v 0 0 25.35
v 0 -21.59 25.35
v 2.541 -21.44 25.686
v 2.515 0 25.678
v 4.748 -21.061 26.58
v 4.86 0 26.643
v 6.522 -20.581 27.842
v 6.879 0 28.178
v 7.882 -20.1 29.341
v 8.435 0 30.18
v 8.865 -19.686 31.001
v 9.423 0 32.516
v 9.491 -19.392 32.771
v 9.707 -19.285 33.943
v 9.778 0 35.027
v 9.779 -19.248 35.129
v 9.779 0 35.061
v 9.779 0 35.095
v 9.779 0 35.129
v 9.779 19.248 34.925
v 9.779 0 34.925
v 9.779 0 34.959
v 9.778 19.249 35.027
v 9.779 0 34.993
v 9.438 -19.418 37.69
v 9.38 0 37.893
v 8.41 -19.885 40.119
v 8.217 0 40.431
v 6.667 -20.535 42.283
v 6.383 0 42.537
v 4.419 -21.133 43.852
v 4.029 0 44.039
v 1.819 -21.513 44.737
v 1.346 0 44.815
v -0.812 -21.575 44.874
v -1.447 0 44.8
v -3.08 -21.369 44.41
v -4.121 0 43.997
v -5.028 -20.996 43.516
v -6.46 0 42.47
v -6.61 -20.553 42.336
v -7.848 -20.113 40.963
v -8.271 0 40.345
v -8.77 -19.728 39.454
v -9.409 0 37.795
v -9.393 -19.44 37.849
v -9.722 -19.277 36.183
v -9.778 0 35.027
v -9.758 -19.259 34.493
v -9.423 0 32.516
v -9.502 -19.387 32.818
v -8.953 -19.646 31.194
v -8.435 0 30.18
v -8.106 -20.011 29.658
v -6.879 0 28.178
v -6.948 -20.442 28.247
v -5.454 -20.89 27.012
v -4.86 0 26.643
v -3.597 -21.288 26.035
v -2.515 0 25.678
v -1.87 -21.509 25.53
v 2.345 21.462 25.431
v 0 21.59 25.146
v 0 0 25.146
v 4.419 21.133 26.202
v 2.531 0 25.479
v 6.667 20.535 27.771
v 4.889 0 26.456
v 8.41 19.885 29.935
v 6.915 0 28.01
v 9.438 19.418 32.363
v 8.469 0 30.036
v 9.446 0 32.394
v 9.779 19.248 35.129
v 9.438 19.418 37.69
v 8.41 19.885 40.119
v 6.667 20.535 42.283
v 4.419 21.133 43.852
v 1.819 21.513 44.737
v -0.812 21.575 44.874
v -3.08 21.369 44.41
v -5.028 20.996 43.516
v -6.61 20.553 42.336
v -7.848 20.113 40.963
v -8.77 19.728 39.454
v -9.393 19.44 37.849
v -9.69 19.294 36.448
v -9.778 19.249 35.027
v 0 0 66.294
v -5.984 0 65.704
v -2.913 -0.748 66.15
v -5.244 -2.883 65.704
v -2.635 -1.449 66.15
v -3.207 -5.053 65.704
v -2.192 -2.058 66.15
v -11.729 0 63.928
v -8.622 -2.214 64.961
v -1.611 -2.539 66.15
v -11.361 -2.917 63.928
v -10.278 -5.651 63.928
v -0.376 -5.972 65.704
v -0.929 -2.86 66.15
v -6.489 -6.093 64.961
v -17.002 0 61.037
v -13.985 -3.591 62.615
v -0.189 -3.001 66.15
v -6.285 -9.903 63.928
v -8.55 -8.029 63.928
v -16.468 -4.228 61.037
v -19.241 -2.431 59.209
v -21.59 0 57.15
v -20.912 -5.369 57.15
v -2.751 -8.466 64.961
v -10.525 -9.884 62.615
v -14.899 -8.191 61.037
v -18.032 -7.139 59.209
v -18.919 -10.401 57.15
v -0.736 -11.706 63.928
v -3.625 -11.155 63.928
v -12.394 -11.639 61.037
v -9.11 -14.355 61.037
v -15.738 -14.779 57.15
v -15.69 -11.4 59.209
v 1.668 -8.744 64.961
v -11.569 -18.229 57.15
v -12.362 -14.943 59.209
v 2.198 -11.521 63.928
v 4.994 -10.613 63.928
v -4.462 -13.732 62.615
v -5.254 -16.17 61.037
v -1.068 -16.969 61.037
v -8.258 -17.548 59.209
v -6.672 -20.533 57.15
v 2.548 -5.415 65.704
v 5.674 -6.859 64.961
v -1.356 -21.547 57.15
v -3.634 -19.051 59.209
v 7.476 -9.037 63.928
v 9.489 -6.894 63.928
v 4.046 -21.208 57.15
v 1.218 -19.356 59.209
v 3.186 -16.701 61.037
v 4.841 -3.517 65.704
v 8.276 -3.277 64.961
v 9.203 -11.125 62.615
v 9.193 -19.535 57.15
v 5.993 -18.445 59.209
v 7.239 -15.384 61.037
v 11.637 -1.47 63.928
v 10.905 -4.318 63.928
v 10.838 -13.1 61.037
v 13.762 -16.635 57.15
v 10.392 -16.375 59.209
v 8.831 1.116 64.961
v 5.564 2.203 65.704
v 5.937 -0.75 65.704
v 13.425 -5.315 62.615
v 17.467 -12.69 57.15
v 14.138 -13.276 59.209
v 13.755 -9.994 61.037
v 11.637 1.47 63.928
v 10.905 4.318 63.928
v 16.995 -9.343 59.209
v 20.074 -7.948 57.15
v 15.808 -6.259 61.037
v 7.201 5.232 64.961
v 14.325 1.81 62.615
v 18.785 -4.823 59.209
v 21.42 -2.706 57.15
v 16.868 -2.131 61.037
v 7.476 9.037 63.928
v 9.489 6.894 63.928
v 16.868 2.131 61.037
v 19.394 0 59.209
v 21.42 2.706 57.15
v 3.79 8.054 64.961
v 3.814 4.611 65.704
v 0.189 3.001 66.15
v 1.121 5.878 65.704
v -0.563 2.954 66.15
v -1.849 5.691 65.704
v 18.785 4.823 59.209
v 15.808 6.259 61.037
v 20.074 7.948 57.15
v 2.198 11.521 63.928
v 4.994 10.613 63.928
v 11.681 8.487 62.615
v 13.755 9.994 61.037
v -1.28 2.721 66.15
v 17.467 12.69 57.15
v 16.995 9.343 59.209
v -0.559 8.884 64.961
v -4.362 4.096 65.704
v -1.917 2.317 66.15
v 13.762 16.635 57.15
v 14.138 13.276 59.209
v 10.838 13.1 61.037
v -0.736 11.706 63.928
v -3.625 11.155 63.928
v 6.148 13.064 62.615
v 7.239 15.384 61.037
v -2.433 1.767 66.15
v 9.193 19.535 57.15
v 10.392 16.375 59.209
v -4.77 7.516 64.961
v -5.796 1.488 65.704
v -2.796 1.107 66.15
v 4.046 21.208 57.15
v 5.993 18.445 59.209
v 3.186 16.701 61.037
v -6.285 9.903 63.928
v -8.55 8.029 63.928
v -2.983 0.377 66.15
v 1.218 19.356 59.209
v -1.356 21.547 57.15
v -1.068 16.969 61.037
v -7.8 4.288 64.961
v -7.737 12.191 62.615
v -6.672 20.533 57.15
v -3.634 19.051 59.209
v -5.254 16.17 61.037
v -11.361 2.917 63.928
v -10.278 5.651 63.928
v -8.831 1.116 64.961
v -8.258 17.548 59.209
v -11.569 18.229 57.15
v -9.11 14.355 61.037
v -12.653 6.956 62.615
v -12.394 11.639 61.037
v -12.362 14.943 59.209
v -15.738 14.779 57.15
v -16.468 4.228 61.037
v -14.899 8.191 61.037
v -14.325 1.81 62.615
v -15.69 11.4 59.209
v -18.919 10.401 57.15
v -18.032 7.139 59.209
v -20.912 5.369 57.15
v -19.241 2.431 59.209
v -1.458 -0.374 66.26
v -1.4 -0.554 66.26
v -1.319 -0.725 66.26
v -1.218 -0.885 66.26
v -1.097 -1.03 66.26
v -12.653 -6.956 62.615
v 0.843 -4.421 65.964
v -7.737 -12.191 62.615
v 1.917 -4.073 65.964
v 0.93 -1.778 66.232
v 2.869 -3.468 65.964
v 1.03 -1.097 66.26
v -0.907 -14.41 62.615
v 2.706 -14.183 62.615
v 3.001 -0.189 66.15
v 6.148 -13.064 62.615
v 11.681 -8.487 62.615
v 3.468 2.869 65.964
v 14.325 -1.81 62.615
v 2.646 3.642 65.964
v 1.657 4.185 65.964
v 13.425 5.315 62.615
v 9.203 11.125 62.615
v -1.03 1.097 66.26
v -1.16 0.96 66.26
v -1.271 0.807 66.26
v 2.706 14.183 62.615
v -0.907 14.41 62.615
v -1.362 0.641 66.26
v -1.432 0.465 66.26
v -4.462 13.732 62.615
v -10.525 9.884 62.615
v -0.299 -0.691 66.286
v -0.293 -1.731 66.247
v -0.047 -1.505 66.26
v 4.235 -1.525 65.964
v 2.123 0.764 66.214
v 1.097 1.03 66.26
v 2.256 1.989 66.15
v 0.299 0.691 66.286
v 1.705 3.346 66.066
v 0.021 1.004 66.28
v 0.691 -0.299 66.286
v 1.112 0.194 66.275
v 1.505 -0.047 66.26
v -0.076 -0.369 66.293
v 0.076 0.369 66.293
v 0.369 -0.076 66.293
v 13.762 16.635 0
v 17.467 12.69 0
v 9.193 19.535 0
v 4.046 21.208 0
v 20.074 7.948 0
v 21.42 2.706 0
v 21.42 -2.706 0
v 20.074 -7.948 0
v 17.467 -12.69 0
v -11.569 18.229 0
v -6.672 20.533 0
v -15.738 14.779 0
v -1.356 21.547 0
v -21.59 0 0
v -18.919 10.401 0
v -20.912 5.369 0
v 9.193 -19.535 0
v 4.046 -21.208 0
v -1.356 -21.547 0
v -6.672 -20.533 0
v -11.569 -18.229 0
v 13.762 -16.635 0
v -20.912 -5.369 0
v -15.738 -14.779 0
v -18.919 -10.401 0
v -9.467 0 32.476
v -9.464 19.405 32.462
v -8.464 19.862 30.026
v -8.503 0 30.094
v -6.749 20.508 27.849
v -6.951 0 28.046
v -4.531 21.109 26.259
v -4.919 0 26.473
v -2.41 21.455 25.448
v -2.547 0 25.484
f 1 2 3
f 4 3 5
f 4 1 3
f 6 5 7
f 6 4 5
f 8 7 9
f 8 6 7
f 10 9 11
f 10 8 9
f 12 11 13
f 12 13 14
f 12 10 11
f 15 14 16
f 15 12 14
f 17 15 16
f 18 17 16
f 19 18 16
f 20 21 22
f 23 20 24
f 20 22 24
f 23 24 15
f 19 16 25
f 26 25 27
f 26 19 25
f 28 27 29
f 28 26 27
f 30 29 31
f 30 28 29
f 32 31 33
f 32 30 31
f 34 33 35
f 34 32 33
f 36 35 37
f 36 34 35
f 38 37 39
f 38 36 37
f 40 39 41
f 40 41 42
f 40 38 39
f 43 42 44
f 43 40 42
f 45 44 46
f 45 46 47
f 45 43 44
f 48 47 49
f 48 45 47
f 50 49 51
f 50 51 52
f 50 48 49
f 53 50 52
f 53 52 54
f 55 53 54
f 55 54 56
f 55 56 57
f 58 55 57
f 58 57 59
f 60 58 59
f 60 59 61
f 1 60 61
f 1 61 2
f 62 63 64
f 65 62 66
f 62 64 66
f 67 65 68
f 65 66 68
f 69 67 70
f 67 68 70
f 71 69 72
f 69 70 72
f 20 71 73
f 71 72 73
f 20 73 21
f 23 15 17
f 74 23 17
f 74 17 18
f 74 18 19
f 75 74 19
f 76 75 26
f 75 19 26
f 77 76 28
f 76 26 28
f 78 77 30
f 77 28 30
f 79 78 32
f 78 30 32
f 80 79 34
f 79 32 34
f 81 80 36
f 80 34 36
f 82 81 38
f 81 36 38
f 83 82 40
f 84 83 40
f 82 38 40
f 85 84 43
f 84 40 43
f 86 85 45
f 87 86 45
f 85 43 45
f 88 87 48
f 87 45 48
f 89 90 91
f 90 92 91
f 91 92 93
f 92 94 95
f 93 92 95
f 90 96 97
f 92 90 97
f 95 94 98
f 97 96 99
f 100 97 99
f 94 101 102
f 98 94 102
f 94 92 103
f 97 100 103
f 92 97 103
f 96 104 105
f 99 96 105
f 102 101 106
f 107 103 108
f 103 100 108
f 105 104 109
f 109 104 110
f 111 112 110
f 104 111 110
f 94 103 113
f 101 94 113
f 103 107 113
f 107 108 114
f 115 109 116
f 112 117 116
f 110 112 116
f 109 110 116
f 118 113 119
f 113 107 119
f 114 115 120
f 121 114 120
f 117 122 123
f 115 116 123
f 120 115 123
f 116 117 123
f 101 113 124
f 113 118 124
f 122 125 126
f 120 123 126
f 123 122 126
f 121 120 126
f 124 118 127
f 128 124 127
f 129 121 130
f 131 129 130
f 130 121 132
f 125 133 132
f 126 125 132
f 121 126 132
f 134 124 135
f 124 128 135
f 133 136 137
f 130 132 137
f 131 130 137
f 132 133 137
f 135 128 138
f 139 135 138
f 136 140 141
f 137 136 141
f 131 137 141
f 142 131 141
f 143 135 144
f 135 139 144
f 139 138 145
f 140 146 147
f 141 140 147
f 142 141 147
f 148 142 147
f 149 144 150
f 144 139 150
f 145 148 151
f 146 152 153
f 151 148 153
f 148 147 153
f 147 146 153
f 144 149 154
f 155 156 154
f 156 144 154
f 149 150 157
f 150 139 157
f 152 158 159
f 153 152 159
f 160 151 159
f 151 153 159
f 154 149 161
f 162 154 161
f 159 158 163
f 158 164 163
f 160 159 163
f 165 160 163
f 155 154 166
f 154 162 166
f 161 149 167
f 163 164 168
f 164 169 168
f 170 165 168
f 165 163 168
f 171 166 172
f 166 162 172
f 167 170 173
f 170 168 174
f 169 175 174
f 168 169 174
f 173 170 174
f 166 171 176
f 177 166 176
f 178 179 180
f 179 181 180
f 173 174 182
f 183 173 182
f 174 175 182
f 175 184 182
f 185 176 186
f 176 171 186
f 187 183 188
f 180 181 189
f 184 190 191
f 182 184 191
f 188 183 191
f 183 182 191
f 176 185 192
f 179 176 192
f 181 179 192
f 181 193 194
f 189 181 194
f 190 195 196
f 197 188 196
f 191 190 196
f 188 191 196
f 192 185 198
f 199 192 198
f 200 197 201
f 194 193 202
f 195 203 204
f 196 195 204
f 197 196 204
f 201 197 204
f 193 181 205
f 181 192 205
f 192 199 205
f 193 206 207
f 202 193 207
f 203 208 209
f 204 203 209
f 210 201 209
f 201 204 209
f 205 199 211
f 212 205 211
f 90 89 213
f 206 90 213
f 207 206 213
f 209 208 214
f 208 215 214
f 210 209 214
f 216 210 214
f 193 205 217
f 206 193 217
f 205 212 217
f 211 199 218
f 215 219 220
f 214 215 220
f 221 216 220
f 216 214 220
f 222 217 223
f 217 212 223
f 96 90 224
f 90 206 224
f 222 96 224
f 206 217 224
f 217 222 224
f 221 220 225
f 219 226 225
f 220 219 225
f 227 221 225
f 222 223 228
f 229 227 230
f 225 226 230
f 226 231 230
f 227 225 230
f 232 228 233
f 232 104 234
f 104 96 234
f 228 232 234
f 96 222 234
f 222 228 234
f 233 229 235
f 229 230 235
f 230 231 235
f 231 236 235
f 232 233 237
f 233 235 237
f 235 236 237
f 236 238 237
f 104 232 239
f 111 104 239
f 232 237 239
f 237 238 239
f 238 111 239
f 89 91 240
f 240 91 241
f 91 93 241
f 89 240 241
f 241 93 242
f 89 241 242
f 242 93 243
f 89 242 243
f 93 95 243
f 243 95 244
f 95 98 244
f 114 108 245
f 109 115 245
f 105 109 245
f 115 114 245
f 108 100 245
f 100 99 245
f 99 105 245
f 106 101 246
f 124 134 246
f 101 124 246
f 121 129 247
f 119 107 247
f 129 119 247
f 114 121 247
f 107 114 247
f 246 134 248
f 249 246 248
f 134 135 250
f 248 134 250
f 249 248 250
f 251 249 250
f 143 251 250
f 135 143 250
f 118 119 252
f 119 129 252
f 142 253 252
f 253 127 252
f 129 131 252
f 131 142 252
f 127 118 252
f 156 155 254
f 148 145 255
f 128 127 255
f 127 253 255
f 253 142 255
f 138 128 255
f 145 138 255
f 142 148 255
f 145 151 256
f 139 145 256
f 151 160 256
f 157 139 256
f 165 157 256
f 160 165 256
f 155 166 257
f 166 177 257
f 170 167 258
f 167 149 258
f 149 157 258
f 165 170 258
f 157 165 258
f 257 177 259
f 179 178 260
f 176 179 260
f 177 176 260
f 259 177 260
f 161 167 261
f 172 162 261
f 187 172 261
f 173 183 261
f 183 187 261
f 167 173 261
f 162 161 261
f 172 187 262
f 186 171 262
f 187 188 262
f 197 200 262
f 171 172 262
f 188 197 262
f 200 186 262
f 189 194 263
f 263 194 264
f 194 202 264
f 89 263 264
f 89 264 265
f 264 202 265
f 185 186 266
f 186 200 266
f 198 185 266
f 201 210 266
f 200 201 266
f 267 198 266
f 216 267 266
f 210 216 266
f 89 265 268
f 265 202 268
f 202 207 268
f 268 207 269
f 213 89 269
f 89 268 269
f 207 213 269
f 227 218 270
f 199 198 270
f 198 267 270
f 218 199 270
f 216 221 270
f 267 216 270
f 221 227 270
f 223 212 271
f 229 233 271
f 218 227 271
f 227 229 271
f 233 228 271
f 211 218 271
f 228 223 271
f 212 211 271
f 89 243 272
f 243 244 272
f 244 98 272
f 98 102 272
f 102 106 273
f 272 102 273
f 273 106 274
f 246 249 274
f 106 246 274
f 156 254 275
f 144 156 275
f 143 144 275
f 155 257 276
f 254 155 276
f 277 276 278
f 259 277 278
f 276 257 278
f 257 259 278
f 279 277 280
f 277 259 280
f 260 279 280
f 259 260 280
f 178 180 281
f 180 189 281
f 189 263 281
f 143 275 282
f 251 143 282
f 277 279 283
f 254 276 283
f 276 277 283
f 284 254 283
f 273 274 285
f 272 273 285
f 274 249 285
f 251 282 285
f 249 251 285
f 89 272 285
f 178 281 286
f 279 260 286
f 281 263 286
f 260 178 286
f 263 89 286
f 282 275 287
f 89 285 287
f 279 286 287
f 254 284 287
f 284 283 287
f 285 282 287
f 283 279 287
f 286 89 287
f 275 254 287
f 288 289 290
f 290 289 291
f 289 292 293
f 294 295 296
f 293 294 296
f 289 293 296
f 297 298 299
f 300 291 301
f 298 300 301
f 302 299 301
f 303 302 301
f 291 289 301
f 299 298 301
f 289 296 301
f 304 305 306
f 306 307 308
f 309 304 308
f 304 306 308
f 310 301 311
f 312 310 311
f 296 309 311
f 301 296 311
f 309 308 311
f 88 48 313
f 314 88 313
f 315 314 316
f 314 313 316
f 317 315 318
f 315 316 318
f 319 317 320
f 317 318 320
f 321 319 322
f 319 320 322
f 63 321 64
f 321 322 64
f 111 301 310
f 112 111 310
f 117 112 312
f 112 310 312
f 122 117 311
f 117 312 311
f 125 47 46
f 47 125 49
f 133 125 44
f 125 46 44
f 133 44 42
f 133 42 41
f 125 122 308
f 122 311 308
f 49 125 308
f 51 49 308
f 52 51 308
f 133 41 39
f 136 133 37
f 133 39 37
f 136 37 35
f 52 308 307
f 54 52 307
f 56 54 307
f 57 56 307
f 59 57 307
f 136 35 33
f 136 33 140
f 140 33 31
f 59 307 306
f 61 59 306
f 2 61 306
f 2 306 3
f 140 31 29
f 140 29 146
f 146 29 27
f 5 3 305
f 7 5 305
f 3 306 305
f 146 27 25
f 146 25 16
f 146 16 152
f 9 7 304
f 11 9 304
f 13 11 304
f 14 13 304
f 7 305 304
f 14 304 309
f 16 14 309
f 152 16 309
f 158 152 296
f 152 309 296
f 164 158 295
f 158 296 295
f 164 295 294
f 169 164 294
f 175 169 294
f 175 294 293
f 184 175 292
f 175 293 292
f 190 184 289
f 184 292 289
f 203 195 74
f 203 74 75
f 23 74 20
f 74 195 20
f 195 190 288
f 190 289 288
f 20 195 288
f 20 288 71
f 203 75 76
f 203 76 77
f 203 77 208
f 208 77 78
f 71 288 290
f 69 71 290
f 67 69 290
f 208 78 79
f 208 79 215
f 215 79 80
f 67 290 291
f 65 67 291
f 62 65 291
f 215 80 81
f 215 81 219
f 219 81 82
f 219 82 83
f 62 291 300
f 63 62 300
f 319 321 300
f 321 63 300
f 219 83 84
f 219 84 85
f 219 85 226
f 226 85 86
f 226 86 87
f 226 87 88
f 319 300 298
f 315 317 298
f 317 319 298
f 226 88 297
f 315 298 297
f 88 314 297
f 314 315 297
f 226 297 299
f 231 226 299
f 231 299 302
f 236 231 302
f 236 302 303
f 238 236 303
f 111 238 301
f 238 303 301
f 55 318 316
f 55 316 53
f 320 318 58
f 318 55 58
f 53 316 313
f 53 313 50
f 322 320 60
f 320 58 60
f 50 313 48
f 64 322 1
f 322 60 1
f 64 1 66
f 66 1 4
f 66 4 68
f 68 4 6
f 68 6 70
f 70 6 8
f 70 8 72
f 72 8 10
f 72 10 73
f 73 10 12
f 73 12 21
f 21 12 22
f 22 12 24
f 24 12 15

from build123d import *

# Parameters (mm, degrees)
F4_DEPTH       = 21.5910001
F5_DEPTH       = 21.5910001
F6_DEPTH       = 21.5910001
F7_DEPTH       = 21.5910001
F8_DEPTH       = 21.5910001
F9_DEPTH       = 21.5910001
F11_DEPTH      = 21.5910001
F12_DEPTH      = 21.5910001
F12_DEPTH_BACK = 25.4


with BuildPart() as f1:
    # F0 (on Front) → F1 (revolve)
    with BuildSketch(Plane.XZ):
        with BuildLine():
            Line((-21.59, 0), (0, 0))
            Line((0, 0), (0, 66.294))
            ThreePointArc((0, 66.294), (-11.7291440927, 63.9276179966), (-21.59, 57.15))
            Line((-21.59, 57.15), (-21.59, 0))
        make_face()
    revolve(axis=Axis((0, 0, 33.147), (0, 0, 1)))

    # F3 (on Front) → F4 (cut, through all)
    with BuildSketch(Plane.XZ):
        with BuildLine():
            ThreePointArc((0, 25.146), (6.9147972132, 28.0102027868), (9.779, 34.925))
            ThreePointArc((9.779, 34.925), (-6.9147972132, 41.8397972132), (0, 25.146))
        make_face()
    extrude(amount=-F4_DEPTH, mode=Mode.SUBTRACT)

    # F2 (on Front) → F5 (cut, through all)
    with BuildSketch(Plane.XZ):
        with BuildLine():
            ThreePointArc((0, 25.146), (6.9147972132, 28.0102027868), (9.779, 34.925))
            ThreePointArc((9.779, 34.925), (-6.9147972132, 41.8397972132), (0, 25.146))
        make_face()
    extrude(amount=-F5_DEPTH, mode=Mode.SUBTRACT)

    # F3 (on Front) → F6 (cut, through all)
    with BuildSketch(Plane.XZ):
        with BuildLine():
            ThreePointArc((0, 25.146), (6.9147972132, 28.0102027868), (9.779, 34.925))
            ThreePointArc((9.779, 34.925), (-6.9147972132, 41.8397972132), (0, 25.146))
        make_face()
    extrude(amount=-F6_DEPTH, mode=Mode.SUBTRACT)

    # F3 (on Front) → F7 (cut, through all)
    with BuildSketch(Plane.XZ):
        with BuildLine():
            ThreePointArc((0, 25.146), (6.9147972132, 28.0102027868), (9.779, 34.925))
            ThreePointArc((9.779, 34.925), (-6.9147972132, 41.8397972132), (0, 25.146))
        make_face()
    extrude(amount=-F7_DEPTH, mode=Mode.SUBTRACT)

    # F3 (on Front) → F8 (cut, through all)
    with BuildSketch(Plane.XZ):
        with BuildLine():
            ThreePointArc((0, 25.146), (6.9147972132, 28.0102027868), (9.779, 34.925))
            ThreePointArc((9.779, 34.925), (-6.9147972132, 41.8397972132), (0, 25.146))
        make_face()
    extrude(amount=-F8_DEPTH, mode=Mode.SUBTRACT)

    # F3 (on Front) → F9 (cut, through all)
    with BuildSketch(Plane.XZ):
        with BuildLine():
            ThreePointArc((0, 25.146), (6.9147972132, 28.0102027868), (9.779, 34.925))
            ThreePointArc((9.779, 34.925), (-6.9147972132, 41.8397972132), (0, 25.146))
        make_face()
    extrude(amount=-F9_DEPTH, mode=Mode.SUBTRACT)

    # F3 (on Front) → F11 (cut, through all)
    with BuildSketch(Plane.XZ):
        with BuildLine():
            ThreePointArc((0, 25.146), (6.9147972132, 28.0102027868), (9.779, 34.925))
            ThreePointArc((9.779, 34.925), (-6.9147972132, 41.8397972132), (0, 25.146))
        make_face()
    extrude(amount=-F11_DEPTH, mode=Mode.SUBTRACT)

    # F10 (on Front) → F12 (cut, two sides)
    with BuildSketch(Plane.XZ) as f12_sk:
        with BuildLine():
            ThreePointArc((0, 25.3496200125), (6.9147972132, 28.2138227993), (9.779, 35.1286200125))
            ThreePointArc((9.779, 35.1286200125), (-6.9147972132, 42.0434172257), (0, 25.3496200125))
        make_face()
    extrude(amount=-F12_DEPTH, mode=Mode.SUBTRACT)
    extrude(f12_sk.sketch, amount=F12_DEPTH_BACK, mode=Mode.SUBTRACT)


solid = f1.part
